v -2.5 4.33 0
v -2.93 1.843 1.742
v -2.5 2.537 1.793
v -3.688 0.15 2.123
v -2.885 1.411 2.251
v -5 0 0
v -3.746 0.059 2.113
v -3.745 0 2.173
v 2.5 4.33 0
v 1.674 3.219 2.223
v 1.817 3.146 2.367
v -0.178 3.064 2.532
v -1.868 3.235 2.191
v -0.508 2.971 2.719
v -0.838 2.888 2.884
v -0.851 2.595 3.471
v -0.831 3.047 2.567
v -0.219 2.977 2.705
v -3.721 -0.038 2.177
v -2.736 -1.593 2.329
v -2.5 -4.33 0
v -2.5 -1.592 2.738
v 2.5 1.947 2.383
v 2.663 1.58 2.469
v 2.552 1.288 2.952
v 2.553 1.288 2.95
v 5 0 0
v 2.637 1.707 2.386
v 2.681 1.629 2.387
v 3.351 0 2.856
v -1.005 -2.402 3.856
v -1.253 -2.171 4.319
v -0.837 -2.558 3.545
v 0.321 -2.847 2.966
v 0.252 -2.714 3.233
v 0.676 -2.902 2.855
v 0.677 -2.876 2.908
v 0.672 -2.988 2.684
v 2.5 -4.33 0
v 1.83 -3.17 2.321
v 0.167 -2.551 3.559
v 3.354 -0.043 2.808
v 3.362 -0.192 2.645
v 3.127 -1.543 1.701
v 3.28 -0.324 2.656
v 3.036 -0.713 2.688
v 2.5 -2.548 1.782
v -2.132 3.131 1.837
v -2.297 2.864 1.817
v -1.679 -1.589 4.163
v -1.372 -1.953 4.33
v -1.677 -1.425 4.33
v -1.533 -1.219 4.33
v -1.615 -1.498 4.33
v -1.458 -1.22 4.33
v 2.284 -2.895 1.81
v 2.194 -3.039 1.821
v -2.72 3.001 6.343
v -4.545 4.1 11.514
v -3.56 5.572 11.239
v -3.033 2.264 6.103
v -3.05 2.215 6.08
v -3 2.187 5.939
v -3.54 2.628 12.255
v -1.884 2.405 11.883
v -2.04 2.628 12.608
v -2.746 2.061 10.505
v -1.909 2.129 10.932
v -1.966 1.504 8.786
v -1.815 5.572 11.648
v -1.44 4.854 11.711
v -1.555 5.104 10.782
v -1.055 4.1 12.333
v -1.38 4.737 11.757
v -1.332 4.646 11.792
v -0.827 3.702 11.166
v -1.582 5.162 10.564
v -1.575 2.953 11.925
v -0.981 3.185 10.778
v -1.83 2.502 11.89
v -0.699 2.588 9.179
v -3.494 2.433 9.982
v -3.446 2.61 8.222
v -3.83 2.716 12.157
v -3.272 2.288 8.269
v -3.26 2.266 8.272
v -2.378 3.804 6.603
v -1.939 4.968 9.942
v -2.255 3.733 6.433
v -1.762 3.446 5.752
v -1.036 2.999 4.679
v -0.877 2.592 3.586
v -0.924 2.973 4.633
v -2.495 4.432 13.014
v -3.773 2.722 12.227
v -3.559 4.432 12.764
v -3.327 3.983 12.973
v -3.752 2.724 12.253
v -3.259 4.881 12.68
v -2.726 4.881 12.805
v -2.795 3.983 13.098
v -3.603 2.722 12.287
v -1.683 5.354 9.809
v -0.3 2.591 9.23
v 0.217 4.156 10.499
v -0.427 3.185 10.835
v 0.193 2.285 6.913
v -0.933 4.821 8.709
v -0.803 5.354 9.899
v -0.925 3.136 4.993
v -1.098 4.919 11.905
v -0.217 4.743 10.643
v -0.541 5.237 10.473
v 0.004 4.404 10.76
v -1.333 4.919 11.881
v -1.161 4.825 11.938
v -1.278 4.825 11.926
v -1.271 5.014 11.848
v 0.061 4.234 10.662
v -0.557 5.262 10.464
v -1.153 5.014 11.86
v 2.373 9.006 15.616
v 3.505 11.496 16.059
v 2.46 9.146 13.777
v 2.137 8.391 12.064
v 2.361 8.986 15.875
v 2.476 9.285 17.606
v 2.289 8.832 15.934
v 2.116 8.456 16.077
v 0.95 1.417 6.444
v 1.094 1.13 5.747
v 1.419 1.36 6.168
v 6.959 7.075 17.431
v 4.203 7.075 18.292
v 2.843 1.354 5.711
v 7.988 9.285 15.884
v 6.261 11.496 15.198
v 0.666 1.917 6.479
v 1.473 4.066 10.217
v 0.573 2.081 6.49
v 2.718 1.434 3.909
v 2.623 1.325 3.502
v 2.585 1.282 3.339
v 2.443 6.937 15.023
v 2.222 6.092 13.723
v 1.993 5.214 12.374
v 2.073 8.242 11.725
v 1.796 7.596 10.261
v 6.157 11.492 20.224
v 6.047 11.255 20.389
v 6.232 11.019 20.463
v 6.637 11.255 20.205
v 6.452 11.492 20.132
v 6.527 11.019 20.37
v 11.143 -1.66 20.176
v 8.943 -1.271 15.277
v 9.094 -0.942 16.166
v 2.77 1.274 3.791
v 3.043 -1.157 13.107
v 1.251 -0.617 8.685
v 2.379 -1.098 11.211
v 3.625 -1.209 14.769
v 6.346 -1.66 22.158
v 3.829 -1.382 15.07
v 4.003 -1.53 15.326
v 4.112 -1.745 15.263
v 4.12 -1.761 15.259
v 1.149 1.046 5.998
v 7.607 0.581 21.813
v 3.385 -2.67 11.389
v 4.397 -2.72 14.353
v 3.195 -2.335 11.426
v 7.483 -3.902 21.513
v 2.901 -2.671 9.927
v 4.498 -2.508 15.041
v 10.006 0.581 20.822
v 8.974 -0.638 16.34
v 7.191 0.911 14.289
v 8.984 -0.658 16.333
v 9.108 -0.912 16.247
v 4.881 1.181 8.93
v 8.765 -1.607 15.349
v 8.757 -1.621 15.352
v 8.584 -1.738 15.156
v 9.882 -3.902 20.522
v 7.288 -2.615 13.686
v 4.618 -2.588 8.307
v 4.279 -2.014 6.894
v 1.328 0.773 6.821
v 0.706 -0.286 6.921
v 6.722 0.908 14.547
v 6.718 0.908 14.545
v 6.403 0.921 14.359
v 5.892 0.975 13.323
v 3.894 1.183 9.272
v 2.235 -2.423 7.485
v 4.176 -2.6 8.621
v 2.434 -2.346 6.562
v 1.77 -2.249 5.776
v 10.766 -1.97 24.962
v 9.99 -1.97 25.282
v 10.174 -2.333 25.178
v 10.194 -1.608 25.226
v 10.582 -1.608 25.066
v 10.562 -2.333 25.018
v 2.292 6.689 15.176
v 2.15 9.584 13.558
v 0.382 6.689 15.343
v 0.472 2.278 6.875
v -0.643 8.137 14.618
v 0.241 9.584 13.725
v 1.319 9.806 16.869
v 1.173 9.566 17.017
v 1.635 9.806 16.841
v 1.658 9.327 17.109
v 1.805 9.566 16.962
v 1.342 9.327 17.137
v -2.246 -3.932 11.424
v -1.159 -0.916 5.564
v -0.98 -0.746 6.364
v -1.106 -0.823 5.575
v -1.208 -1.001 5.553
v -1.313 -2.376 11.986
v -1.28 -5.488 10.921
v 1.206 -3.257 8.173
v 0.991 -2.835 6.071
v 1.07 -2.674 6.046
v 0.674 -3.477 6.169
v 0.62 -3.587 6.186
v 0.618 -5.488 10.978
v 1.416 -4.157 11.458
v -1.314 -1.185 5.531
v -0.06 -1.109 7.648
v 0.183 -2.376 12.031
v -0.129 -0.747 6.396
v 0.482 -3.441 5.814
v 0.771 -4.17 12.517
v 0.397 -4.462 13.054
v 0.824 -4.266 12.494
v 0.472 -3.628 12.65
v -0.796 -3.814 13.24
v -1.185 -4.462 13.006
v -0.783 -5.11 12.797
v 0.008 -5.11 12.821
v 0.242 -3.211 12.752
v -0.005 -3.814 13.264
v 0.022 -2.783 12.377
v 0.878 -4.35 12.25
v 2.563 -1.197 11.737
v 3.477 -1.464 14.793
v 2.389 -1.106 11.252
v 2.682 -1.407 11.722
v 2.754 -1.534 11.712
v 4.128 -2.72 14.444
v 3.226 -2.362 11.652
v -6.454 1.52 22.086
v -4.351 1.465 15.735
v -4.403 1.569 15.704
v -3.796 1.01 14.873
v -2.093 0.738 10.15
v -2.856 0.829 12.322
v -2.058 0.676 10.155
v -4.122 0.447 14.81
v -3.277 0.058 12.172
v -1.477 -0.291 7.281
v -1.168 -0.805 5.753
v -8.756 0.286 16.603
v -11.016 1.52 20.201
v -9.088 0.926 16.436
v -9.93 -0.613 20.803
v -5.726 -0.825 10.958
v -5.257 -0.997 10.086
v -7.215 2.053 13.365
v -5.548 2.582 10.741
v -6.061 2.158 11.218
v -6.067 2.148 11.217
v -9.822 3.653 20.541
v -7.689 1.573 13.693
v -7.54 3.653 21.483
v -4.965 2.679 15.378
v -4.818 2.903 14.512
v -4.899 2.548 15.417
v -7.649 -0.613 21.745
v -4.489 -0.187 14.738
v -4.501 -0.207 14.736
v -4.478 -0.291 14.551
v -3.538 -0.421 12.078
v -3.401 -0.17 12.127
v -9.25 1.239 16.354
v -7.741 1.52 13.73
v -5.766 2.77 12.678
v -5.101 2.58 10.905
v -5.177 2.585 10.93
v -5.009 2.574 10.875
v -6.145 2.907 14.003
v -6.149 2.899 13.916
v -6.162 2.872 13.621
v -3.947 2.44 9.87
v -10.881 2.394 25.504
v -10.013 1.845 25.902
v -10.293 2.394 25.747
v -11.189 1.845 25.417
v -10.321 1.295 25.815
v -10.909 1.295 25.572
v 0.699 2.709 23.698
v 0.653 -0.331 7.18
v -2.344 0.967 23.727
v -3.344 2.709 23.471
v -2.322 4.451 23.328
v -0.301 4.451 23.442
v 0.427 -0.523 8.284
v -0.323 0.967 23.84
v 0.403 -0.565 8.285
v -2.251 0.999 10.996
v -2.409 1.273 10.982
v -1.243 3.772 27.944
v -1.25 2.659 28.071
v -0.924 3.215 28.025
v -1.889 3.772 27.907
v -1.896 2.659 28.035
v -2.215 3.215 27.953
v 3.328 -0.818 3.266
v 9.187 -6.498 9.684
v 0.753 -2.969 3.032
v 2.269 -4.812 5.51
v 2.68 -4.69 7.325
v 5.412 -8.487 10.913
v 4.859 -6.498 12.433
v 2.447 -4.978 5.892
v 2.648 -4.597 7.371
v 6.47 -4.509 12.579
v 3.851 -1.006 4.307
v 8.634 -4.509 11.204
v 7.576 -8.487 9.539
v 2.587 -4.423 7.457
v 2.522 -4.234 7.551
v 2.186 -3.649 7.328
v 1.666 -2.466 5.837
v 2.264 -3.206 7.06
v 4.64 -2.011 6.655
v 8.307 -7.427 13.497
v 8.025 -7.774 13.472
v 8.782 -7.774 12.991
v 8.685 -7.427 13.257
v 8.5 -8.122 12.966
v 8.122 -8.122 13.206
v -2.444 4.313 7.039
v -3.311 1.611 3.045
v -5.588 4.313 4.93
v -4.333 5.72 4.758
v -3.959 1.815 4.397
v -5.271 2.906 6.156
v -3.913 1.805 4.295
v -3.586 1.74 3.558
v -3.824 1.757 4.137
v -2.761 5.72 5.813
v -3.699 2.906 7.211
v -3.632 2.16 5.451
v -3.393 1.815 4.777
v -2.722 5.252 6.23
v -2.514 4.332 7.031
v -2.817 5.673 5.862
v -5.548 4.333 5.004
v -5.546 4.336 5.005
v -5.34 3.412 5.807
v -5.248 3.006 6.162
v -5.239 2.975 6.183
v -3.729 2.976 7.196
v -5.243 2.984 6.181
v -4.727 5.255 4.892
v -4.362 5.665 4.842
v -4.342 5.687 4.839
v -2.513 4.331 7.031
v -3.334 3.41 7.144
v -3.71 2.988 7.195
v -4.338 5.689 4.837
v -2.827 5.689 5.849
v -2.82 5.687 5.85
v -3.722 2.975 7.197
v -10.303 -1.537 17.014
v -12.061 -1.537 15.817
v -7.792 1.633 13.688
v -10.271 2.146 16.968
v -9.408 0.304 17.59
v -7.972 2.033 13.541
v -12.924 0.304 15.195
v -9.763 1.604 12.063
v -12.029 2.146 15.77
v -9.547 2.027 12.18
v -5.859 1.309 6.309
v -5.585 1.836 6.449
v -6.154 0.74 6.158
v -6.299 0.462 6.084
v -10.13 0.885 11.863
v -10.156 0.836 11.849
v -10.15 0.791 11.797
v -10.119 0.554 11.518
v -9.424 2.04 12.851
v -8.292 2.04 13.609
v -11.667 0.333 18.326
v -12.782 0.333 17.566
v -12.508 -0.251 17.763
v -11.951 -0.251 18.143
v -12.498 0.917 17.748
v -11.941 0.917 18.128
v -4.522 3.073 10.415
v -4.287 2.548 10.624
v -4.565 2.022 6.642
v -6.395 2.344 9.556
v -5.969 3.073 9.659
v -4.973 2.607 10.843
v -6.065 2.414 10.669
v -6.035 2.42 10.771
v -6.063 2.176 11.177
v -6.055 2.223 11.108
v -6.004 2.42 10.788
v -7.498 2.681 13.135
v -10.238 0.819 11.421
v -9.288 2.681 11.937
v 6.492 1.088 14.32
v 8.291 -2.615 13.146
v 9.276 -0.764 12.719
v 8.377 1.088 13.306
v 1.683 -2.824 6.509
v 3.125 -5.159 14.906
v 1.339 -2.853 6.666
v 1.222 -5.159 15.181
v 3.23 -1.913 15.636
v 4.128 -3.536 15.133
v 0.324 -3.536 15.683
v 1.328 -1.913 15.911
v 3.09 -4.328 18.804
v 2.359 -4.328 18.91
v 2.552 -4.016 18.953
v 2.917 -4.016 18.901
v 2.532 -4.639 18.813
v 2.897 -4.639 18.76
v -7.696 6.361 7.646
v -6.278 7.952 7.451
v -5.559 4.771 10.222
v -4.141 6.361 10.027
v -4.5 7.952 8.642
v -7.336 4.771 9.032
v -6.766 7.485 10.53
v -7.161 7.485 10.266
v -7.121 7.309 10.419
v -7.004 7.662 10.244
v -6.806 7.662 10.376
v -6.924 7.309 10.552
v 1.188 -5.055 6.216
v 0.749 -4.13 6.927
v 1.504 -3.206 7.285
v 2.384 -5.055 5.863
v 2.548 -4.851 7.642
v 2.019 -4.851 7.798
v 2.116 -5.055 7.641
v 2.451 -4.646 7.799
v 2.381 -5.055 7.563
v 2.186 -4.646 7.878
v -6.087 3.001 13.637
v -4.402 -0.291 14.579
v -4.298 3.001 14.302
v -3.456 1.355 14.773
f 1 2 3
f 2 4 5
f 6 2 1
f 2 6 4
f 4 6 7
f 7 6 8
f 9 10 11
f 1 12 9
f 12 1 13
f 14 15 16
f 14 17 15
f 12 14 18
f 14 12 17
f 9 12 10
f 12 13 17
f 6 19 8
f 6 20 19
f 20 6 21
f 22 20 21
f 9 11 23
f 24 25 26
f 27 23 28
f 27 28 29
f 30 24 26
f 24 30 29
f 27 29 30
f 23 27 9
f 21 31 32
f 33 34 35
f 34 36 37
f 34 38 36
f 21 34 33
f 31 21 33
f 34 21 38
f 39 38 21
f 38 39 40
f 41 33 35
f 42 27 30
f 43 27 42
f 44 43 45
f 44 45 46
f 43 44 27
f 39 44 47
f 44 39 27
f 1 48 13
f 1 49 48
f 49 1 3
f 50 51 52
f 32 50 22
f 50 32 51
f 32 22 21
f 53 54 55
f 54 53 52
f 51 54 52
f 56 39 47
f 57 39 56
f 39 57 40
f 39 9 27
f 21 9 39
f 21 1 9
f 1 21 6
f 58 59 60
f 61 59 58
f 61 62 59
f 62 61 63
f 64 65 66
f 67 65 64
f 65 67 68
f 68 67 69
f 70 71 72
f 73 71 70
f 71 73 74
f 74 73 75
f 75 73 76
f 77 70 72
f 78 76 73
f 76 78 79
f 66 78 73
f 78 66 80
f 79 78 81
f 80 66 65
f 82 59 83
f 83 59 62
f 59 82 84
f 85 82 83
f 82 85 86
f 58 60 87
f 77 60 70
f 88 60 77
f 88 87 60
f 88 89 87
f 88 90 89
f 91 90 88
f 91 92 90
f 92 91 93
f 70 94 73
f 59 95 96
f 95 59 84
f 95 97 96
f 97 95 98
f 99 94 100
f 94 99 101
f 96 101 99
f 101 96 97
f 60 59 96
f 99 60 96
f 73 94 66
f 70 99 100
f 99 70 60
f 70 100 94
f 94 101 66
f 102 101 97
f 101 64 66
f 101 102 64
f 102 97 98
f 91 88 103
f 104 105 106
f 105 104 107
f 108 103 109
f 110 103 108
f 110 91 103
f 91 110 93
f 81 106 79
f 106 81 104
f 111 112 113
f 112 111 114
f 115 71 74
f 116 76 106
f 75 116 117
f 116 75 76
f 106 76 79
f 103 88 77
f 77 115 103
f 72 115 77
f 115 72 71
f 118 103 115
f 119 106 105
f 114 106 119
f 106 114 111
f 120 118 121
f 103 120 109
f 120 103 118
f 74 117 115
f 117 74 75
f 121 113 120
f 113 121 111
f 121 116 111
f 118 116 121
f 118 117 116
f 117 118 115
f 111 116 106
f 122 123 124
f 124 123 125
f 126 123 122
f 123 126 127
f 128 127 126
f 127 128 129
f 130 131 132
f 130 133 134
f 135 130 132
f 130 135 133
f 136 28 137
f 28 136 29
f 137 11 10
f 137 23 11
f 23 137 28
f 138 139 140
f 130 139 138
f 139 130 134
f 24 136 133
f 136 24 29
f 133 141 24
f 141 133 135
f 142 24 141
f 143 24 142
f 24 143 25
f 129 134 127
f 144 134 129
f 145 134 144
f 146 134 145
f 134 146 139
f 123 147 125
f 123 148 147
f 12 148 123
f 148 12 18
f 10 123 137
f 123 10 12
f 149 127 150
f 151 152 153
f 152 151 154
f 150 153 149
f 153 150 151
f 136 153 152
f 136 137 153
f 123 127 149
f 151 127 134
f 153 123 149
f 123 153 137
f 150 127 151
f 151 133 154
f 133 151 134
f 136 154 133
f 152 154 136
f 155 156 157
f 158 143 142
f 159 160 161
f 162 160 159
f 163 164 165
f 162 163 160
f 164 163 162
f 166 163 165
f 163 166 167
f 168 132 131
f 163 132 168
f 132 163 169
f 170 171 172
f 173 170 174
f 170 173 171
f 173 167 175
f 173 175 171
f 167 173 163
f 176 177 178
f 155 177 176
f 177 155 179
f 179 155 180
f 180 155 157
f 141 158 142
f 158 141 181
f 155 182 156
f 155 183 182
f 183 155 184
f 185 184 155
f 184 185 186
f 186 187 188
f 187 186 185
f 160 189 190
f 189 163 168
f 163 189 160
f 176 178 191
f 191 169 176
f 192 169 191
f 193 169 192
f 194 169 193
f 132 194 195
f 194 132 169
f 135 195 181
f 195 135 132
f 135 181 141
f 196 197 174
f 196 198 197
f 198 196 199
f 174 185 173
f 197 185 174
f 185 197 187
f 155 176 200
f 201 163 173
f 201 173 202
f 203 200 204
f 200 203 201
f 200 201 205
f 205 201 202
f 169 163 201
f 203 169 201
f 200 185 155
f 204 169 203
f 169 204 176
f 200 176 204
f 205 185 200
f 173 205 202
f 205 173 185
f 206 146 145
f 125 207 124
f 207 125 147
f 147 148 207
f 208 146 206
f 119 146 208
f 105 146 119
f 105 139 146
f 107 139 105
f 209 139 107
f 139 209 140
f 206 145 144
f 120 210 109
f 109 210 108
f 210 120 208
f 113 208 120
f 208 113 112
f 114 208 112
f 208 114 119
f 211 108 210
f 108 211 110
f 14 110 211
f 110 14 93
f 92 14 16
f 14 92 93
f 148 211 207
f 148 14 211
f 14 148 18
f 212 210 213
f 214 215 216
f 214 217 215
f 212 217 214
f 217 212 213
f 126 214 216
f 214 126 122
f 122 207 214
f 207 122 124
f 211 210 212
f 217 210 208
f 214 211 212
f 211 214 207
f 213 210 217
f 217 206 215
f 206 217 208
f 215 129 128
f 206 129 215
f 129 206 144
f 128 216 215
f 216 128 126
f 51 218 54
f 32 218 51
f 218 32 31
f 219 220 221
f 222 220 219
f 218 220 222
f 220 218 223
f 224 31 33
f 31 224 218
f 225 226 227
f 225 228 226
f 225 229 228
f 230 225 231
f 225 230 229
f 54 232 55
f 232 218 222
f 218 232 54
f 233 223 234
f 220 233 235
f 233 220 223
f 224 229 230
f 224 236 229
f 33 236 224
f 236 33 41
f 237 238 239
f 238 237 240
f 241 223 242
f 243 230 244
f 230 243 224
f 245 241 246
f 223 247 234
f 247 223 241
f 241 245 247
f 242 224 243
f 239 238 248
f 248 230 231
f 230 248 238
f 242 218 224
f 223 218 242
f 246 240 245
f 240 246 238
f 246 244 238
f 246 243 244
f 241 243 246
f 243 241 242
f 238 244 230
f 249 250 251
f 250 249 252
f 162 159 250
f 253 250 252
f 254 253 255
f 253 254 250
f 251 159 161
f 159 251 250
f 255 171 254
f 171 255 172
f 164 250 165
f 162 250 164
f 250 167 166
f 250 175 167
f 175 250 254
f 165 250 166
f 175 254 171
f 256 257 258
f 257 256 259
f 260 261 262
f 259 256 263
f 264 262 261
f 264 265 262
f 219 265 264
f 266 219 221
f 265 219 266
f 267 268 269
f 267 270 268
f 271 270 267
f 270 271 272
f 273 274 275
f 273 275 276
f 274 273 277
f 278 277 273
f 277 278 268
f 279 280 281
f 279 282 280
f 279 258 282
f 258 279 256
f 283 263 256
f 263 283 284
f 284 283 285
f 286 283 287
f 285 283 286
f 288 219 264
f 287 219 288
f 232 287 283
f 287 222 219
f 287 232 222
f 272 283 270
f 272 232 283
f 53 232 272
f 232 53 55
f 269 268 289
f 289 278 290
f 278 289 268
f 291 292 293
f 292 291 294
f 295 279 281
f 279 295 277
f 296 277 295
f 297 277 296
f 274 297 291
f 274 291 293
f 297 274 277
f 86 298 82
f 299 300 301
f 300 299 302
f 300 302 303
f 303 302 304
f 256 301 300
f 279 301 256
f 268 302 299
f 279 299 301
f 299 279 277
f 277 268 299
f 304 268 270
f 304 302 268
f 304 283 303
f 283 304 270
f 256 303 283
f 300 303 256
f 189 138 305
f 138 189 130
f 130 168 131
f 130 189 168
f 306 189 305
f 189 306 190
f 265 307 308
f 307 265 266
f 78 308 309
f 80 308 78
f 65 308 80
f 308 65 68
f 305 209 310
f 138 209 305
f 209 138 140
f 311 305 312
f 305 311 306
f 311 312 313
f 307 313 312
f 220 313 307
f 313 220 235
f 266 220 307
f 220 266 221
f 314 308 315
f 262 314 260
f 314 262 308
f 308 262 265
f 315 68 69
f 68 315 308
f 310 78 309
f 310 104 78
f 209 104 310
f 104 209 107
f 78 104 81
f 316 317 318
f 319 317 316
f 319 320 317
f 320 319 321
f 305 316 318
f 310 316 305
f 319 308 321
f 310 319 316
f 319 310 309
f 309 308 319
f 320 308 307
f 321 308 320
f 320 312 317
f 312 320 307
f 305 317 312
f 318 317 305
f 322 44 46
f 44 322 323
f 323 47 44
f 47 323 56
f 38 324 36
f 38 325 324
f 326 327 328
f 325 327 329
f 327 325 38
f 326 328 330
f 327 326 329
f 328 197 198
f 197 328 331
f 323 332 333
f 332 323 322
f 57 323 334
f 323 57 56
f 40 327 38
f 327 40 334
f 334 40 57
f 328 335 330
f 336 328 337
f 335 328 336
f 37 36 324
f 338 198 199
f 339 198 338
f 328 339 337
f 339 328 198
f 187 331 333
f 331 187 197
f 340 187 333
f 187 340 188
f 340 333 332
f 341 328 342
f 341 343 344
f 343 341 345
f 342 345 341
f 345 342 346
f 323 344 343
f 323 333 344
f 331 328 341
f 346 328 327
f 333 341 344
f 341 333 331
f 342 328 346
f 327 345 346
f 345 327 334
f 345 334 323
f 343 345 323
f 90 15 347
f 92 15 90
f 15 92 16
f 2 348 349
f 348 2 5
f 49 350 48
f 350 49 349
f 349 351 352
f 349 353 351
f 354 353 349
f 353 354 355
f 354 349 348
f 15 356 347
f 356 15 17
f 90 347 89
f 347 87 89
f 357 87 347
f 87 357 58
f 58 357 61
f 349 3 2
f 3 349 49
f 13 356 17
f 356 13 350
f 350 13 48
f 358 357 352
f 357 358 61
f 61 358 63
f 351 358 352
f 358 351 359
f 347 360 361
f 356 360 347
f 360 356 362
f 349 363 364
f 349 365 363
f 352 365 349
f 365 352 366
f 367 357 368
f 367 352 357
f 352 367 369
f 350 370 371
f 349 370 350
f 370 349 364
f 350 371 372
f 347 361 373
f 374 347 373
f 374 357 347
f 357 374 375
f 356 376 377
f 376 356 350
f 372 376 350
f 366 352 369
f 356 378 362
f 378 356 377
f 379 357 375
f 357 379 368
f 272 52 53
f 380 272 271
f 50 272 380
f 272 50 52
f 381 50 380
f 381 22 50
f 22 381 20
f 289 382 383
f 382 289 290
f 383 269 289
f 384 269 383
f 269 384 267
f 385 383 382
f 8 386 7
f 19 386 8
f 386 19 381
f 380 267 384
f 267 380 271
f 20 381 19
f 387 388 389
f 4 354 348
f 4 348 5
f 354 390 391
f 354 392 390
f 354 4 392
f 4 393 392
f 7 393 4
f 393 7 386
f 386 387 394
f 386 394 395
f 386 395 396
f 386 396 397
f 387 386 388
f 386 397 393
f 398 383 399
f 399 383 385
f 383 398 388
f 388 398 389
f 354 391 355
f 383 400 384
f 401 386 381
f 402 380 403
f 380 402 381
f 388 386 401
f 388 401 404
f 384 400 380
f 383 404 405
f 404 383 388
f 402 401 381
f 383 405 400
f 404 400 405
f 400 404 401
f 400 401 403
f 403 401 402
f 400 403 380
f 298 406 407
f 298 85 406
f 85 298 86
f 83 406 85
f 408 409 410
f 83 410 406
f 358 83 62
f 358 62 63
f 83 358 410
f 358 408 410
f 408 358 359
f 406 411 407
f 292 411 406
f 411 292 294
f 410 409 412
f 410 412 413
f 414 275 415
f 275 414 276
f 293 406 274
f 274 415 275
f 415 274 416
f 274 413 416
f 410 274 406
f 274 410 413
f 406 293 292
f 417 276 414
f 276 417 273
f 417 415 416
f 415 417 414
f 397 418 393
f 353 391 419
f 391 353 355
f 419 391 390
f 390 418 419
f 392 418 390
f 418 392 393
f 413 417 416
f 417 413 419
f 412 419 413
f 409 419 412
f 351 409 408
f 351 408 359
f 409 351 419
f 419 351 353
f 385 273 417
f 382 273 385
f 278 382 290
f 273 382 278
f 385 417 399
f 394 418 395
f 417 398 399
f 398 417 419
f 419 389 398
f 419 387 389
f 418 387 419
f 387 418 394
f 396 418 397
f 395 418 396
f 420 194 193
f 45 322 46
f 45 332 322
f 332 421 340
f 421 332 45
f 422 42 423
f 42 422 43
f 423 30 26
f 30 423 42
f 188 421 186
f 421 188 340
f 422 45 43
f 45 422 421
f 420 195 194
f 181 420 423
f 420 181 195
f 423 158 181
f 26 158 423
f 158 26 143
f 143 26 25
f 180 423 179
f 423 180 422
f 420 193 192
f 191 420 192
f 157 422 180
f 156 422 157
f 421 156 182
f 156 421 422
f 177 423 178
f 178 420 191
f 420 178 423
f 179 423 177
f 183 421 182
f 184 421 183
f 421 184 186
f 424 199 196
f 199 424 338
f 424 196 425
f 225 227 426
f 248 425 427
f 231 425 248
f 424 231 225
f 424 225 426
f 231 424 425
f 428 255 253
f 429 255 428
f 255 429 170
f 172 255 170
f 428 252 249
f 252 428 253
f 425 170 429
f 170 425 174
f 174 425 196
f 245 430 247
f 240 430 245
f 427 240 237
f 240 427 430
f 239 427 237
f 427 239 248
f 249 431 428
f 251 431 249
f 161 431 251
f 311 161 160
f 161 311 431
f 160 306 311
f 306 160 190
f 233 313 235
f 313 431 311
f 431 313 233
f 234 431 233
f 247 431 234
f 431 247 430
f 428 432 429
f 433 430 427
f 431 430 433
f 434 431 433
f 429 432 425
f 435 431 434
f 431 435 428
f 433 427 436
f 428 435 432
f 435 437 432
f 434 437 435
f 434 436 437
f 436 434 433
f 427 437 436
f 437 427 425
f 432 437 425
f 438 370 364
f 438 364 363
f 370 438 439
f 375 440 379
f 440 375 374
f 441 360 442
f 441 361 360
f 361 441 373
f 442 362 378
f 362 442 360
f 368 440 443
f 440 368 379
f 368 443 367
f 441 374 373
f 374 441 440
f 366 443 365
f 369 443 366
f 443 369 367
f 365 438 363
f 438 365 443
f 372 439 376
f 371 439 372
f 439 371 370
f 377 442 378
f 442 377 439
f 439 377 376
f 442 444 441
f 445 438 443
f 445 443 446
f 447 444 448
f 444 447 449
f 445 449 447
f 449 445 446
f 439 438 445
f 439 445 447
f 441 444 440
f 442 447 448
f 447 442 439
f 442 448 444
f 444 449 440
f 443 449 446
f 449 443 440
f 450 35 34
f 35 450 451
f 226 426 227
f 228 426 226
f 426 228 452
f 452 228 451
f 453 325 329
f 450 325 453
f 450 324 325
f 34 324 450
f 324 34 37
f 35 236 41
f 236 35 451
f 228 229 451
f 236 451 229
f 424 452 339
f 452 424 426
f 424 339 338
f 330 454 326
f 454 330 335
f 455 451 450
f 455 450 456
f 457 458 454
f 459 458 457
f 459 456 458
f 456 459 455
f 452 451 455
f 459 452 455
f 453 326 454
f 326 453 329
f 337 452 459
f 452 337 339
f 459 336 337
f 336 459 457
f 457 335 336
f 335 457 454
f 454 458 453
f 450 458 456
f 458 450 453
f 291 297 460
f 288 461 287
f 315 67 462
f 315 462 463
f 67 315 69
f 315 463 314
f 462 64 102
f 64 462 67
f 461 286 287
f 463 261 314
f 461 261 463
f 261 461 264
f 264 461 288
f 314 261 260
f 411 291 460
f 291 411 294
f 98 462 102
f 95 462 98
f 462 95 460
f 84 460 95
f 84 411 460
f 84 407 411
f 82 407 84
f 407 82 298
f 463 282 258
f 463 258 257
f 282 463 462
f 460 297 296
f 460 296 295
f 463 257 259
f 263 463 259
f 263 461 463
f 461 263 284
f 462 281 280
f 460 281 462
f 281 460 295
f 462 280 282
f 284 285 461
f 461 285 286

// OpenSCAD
/*

Random crystal generator for Thingiverse Customizer

Fernando Jerez 2016

*/

// This is only to force Customizer create many files. Changes doesnt matter. Just click CREATE THING
part = "one"; // [one:Crystal #1, two:Crystal #2, three:Crystal #3, four:Crystal #4,five:Crystal #5,six:Crystal #6,seven:Crystal #7,eight:Crystal #8,nine:Crystal #9,ten:Crystal #10]

/* [Hidden] */
crystalrock();



module crystalrock(){
    union(){
        semisphere(5,$fn=6);
        for(i=[1:20]){
            angleX = 35;
            angleY = 35;
            g1=rands(-angleX,angleX,1)[0];
            g2=rands(-angleY,angleY,1)[0];
        
            lados=6; 
            radio1=rands(1,2,1)[0];
            radio2=rands(1.1,1.6,1)[0]*radio1;
            radio3 = rands(0,0.5,1)[0]*radio2;
            altura=radio1*rands(1,2,1)[0]*5*(0.5+pow((abs(cos(g1)*cos(g2))),4));
            pico=rands(0.1,0.3,1)[0]*altura;    
        
            rotate([g1,g2,0])
            translate([0,0,3])
            crystal(lados,radio1,radio2,radio3,altura,pico);
        }
    }
}




module crystal(lados,radio1,radio2,radio3,altura,pico){
    cylinder(r1=radio1,r2=radio2,h=altura,$fn=lados);
    translate([0,0,altura])
    cylinder(r1=radio2,r2=radio3,h=pico,$fn=lados);
    
}

module semisphere(r){
    difference(){
        sphere(r); 
        translate([0,0,-r]) cube([2*r,2*r,2*r],center = true);
    }
}
